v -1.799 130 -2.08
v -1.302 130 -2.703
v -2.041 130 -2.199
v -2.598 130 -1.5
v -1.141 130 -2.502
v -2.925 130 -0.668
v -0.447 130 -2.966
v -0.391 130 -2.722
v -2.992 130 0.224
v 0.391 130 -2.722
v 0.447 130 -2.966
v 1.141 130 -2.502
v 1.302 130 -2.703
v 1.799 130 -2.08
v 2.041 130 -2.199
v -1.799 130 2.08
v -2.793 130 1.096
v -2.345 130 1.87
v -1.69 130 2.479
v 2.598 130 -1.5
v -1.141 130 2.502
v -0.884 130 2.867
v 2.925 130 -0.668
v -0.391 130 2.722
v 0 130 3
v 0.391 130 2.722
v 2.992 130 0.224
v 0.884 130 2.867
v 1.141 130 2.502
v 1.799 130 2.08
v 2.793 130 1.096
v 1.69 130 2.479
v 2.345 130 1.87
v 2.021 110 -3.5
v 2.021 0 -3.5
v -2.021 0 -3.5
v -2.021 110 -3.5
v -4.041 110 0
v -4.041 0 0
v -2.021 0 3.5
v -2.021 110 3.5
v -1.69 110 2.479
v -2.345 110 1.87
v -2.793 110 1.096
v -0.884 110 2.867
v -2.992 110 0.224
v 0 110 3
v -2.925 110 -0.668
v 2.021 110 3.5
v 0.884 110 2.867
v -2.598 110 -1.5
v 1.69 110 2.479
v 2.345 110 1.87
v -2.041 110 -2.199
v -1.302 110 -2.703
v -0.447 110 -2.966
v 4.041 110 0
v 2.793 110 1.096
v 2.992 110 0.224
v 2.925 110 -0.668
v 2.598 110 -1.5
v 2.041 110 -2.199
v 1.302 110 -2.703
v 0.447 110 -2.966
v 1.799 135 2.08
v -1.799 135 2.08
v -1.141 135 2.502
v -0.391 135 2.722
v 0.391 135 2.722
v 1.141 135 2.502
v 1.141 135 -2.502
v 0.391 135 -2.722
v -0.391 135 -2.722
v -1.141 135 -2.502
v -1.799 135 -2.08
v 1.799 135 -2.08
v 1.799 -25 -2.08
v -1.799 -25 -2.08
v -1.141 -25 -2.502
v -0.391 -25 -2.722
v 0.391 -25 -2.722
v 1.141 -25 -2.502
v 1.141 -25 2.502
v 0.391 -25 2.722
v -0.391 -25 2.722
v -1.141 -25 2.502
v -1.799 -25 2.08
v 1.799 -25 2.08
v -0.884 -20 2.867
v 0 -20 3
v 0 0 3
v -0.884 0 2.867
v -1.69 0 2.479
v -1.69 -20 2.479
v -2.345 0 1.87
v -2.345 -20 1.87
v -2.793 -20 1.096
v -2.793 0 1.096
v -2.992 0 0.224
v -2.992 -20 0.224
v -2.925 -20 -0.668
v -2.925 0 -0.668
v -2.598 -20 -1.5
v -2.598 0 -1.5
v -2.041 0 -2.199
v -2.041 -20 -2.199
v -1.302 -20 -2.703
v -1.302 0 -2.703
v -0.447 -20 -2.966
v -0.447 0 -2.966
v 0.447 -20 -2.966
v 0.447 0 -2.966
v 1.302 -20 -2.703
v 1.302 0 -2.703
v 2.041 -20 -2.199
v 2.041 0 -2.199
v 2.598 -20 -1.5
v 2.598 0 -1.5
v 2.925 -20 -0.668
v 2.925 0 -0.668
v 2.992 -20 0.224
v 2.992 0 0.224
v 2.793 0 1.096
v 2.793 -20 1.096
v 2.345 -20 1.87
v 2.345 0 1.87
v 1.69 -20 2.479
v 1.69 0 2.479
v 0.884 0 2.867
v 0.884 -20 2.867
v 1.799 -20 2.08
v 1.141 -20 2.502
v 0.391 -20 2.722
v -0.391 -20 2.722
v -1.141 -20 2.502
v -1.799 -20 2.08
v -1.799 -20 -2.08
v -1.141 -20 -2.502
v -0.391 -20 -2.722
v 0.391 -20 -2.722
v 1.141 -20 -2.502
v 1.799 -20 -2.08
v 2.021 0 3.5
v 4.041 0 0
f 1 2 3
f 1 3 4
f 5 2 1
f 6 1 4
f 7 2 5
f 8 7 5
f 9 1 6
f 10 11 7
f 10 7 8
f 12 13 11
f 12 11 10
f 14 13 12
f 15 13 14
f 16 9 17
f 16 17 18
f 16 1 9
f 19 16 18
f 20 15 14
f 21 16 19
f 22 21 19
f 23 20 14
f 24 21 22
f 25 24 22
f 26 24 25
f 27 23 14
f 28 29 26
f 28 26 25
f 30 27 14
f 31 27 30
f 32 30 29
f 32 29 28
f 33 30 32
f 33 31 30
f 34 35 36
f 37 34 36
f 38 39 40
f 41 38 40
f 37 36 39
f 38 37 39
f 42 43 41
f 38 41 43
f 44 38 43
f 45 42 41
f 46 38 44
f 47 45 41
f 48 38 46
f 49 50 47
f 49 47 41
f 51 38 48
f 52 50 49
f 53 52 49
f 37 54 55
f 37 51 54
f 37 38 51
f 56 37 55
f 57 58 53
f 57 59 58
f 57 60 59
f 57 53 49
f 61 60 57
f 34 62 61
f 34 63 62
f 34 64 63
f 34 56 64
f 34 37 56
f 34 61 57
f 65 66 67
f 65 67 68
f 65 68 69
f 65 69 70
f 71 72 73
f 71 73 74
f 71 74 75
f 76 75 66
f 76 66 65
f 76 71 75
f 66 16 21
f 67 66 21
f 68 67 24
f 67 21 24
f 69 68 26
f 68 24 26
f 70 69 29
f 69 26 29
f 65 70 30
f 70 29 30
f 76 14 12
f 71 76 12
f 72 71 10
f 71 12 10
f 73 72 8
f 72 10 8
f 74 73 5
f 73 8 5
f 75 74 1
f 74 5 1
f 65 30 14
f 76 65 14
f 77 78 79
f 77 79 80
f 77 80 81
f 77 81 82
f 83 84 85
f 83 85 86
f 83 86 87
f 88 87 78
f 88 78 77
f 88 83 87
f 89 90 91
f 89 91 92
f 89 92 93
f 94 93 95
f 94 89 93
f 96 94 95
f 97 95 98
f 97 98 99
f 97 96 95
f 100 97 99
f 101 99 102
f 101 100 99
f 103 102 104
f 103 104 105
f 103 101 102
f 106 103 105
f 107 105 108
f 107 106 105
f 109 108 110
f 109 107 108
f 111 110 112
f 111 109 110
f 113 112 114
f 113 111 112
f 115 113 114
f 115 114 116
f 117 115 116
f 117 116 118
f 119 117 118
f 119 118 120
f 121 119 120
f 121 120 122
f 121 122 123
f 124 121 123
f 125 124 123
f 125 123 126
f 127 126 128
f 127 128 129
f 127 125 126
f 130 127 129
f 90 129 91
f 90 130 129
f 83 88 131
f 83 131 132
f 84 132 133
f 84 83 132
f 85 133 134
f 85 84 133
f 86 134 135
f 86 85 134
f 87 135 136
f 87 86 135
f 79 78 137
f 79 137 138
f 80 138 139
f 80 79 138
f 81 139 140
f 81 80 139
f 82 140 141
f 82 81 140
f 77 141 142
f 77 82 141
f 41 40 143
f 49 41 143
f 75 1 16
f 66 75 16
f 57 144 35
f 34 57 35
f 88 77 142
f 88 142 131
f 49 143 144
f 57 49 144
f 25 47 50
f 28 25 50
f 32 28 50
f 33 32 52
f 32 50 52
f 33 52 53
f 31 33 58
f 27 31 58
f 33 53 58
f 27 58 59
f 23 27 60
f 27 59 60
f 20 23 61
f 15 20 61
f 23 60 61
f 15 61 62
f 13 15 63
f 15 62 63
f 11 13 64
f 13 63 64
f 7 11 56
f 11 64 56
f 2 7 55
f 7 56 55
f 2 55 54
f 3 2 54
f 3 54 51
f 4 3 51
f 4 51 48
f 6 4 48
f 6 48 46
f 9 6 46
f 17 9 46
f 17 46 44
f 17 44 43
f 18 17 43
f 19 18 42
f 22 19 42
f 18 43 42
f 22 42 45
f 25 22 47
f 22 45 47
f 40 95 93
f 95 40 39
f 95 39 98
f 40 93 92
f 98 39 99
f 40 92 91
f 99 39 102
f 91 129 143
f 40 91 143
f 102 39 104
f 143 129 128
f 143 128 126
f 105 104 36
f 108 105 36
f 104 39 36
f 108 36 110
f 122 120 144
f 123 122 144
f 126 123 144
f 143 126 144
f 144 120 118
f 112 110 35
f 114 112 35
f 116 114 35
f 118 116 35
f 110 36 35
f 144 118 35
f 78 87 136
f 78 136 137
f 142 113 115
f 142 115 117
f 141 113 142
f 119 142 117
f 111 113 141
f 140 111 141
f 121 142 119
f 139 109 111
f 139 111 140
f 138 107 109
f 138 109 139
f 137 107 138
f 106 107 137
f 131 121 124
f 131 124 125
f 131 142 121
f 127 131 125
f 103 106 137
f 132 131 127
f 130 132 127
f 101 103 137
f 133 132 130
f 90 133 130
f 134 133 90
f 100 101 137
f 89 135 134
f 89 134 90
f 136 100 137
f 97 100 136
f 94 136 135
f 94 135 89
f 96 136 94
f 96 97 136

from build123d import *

# Parameters (mm, degrees)
Y_KSEKLIK_EKSTR_ZYON1_DEPTH = 110
IZIM2_R                     = 3
Y_KSEKLIK_EKSTR_ZYON2_DEPTH = 20
Y_KSEKLIK_EKSTR_ZYON3_DEPTH = 5
Y_KSEKLIK_EKSTR_ZYON4_START = 20
IZIM4_R                     = 3
Y_KSEKLIK_EKSTR_ZYON4_DEPTH = 20
Y_KSEKLIK_EKSTR_ZYON5_START = 5
Y_KSEKLIK_EKSTR_ZYON5_DEPTH = 5


with BuildPart() as part:
    # Çizim1 → Yükseklik-Ekstrüzyon1 (new body)
    with BuildSketch(Plane(origin=(0, 0, 0), x_dir=(1, 0, 0), z_dir=(0, 1, 0))):
        Polygon((4.041451884, 0), (2.020725942, 3.5), (-2.020725942, 3.5), (-4.041451884, 0), (-2.020725942, -3.5), (2.020725942, -3.5), align=None)
    extrude(amount=Y_KSEKLIK_EKSTR_ZYON1_DEPTH)

    # Çizim2 → Yükseklik-Ekstrüzyon2 (add)
    with BuildSketch(Plane(origin=(0, 110, 0), x_dir=(1, 0, 0), z_dir=(0, 1, 0))):
        with Locations(Location((0, 0, 0), (0, 0, 270))):
            Circle(IZIM2_R)
    extrude(amount=Y_KSEKLIK_EKSTR_ZYON2_DEPTH)

    # Çizim3 → Yükseklik-Ekstrüzyon3 (add)
    with BuildSketch(Plane(origin=(0, 130, 0), x_dir=(1, 0, 0), z_dir=(0, 1, 0))):
        with BuildLine():
            ThreePointArc((1.79891634, 2.08), (0, 2.75), (-1.79891634, 2.08))
            Line((-1.79891634, 2.08), (-1.79891634, -2.08))
            ThreePointArc((-1.79891634, -2.08), (0, -2.75), (1.79891634, -2.08))
            Line((1.79891634, -2.08), (1.79891634, 2.08))
        make_face()
    extrude(amount=Y_KSEKLIK_EKSTR_ZYON3_DEPTH)

    # Çizim4 → Yükseklik-Ekstrüzyon4 (add)
    with BuildSketch(Plane.XZ.offset(Y_KSEKLIK_EKSTR_ZYON4_START)):
        with Locations(Location((0, 0, 0), (0, 0, 90))):
            Circle(IZIM4_R)
    extrude(amount=-Y_KSEKLIK_EKSTR_ZYON4_DEPTH)

    # Çizim5 → Yükseklik-Ekstrüzyon5 (add)
    with BuildSketch(Plane.XZ.offset(20).offset(Y_KSEKLIK_EKSTR_ZYON5_START)):
        with BuildLine():
            ThreePointArc((1.79891634, 2.08), (0, 2.75), (-1.79891634, 2.08))
            Line((-1.79891634, 2.08), (-1.79891634, -2.08))
            ThreePointArc((-1.79891634, -2.08), (0, -2.75), (1.79891634, -2.08))
            Line((1.79891634, -2.08), (1.79891634, 2.08))
        make_face()
    extrude(amount=-Y_KSEKLIK_EKSTR_ZYON5_DEPTH)


solid = part.part
